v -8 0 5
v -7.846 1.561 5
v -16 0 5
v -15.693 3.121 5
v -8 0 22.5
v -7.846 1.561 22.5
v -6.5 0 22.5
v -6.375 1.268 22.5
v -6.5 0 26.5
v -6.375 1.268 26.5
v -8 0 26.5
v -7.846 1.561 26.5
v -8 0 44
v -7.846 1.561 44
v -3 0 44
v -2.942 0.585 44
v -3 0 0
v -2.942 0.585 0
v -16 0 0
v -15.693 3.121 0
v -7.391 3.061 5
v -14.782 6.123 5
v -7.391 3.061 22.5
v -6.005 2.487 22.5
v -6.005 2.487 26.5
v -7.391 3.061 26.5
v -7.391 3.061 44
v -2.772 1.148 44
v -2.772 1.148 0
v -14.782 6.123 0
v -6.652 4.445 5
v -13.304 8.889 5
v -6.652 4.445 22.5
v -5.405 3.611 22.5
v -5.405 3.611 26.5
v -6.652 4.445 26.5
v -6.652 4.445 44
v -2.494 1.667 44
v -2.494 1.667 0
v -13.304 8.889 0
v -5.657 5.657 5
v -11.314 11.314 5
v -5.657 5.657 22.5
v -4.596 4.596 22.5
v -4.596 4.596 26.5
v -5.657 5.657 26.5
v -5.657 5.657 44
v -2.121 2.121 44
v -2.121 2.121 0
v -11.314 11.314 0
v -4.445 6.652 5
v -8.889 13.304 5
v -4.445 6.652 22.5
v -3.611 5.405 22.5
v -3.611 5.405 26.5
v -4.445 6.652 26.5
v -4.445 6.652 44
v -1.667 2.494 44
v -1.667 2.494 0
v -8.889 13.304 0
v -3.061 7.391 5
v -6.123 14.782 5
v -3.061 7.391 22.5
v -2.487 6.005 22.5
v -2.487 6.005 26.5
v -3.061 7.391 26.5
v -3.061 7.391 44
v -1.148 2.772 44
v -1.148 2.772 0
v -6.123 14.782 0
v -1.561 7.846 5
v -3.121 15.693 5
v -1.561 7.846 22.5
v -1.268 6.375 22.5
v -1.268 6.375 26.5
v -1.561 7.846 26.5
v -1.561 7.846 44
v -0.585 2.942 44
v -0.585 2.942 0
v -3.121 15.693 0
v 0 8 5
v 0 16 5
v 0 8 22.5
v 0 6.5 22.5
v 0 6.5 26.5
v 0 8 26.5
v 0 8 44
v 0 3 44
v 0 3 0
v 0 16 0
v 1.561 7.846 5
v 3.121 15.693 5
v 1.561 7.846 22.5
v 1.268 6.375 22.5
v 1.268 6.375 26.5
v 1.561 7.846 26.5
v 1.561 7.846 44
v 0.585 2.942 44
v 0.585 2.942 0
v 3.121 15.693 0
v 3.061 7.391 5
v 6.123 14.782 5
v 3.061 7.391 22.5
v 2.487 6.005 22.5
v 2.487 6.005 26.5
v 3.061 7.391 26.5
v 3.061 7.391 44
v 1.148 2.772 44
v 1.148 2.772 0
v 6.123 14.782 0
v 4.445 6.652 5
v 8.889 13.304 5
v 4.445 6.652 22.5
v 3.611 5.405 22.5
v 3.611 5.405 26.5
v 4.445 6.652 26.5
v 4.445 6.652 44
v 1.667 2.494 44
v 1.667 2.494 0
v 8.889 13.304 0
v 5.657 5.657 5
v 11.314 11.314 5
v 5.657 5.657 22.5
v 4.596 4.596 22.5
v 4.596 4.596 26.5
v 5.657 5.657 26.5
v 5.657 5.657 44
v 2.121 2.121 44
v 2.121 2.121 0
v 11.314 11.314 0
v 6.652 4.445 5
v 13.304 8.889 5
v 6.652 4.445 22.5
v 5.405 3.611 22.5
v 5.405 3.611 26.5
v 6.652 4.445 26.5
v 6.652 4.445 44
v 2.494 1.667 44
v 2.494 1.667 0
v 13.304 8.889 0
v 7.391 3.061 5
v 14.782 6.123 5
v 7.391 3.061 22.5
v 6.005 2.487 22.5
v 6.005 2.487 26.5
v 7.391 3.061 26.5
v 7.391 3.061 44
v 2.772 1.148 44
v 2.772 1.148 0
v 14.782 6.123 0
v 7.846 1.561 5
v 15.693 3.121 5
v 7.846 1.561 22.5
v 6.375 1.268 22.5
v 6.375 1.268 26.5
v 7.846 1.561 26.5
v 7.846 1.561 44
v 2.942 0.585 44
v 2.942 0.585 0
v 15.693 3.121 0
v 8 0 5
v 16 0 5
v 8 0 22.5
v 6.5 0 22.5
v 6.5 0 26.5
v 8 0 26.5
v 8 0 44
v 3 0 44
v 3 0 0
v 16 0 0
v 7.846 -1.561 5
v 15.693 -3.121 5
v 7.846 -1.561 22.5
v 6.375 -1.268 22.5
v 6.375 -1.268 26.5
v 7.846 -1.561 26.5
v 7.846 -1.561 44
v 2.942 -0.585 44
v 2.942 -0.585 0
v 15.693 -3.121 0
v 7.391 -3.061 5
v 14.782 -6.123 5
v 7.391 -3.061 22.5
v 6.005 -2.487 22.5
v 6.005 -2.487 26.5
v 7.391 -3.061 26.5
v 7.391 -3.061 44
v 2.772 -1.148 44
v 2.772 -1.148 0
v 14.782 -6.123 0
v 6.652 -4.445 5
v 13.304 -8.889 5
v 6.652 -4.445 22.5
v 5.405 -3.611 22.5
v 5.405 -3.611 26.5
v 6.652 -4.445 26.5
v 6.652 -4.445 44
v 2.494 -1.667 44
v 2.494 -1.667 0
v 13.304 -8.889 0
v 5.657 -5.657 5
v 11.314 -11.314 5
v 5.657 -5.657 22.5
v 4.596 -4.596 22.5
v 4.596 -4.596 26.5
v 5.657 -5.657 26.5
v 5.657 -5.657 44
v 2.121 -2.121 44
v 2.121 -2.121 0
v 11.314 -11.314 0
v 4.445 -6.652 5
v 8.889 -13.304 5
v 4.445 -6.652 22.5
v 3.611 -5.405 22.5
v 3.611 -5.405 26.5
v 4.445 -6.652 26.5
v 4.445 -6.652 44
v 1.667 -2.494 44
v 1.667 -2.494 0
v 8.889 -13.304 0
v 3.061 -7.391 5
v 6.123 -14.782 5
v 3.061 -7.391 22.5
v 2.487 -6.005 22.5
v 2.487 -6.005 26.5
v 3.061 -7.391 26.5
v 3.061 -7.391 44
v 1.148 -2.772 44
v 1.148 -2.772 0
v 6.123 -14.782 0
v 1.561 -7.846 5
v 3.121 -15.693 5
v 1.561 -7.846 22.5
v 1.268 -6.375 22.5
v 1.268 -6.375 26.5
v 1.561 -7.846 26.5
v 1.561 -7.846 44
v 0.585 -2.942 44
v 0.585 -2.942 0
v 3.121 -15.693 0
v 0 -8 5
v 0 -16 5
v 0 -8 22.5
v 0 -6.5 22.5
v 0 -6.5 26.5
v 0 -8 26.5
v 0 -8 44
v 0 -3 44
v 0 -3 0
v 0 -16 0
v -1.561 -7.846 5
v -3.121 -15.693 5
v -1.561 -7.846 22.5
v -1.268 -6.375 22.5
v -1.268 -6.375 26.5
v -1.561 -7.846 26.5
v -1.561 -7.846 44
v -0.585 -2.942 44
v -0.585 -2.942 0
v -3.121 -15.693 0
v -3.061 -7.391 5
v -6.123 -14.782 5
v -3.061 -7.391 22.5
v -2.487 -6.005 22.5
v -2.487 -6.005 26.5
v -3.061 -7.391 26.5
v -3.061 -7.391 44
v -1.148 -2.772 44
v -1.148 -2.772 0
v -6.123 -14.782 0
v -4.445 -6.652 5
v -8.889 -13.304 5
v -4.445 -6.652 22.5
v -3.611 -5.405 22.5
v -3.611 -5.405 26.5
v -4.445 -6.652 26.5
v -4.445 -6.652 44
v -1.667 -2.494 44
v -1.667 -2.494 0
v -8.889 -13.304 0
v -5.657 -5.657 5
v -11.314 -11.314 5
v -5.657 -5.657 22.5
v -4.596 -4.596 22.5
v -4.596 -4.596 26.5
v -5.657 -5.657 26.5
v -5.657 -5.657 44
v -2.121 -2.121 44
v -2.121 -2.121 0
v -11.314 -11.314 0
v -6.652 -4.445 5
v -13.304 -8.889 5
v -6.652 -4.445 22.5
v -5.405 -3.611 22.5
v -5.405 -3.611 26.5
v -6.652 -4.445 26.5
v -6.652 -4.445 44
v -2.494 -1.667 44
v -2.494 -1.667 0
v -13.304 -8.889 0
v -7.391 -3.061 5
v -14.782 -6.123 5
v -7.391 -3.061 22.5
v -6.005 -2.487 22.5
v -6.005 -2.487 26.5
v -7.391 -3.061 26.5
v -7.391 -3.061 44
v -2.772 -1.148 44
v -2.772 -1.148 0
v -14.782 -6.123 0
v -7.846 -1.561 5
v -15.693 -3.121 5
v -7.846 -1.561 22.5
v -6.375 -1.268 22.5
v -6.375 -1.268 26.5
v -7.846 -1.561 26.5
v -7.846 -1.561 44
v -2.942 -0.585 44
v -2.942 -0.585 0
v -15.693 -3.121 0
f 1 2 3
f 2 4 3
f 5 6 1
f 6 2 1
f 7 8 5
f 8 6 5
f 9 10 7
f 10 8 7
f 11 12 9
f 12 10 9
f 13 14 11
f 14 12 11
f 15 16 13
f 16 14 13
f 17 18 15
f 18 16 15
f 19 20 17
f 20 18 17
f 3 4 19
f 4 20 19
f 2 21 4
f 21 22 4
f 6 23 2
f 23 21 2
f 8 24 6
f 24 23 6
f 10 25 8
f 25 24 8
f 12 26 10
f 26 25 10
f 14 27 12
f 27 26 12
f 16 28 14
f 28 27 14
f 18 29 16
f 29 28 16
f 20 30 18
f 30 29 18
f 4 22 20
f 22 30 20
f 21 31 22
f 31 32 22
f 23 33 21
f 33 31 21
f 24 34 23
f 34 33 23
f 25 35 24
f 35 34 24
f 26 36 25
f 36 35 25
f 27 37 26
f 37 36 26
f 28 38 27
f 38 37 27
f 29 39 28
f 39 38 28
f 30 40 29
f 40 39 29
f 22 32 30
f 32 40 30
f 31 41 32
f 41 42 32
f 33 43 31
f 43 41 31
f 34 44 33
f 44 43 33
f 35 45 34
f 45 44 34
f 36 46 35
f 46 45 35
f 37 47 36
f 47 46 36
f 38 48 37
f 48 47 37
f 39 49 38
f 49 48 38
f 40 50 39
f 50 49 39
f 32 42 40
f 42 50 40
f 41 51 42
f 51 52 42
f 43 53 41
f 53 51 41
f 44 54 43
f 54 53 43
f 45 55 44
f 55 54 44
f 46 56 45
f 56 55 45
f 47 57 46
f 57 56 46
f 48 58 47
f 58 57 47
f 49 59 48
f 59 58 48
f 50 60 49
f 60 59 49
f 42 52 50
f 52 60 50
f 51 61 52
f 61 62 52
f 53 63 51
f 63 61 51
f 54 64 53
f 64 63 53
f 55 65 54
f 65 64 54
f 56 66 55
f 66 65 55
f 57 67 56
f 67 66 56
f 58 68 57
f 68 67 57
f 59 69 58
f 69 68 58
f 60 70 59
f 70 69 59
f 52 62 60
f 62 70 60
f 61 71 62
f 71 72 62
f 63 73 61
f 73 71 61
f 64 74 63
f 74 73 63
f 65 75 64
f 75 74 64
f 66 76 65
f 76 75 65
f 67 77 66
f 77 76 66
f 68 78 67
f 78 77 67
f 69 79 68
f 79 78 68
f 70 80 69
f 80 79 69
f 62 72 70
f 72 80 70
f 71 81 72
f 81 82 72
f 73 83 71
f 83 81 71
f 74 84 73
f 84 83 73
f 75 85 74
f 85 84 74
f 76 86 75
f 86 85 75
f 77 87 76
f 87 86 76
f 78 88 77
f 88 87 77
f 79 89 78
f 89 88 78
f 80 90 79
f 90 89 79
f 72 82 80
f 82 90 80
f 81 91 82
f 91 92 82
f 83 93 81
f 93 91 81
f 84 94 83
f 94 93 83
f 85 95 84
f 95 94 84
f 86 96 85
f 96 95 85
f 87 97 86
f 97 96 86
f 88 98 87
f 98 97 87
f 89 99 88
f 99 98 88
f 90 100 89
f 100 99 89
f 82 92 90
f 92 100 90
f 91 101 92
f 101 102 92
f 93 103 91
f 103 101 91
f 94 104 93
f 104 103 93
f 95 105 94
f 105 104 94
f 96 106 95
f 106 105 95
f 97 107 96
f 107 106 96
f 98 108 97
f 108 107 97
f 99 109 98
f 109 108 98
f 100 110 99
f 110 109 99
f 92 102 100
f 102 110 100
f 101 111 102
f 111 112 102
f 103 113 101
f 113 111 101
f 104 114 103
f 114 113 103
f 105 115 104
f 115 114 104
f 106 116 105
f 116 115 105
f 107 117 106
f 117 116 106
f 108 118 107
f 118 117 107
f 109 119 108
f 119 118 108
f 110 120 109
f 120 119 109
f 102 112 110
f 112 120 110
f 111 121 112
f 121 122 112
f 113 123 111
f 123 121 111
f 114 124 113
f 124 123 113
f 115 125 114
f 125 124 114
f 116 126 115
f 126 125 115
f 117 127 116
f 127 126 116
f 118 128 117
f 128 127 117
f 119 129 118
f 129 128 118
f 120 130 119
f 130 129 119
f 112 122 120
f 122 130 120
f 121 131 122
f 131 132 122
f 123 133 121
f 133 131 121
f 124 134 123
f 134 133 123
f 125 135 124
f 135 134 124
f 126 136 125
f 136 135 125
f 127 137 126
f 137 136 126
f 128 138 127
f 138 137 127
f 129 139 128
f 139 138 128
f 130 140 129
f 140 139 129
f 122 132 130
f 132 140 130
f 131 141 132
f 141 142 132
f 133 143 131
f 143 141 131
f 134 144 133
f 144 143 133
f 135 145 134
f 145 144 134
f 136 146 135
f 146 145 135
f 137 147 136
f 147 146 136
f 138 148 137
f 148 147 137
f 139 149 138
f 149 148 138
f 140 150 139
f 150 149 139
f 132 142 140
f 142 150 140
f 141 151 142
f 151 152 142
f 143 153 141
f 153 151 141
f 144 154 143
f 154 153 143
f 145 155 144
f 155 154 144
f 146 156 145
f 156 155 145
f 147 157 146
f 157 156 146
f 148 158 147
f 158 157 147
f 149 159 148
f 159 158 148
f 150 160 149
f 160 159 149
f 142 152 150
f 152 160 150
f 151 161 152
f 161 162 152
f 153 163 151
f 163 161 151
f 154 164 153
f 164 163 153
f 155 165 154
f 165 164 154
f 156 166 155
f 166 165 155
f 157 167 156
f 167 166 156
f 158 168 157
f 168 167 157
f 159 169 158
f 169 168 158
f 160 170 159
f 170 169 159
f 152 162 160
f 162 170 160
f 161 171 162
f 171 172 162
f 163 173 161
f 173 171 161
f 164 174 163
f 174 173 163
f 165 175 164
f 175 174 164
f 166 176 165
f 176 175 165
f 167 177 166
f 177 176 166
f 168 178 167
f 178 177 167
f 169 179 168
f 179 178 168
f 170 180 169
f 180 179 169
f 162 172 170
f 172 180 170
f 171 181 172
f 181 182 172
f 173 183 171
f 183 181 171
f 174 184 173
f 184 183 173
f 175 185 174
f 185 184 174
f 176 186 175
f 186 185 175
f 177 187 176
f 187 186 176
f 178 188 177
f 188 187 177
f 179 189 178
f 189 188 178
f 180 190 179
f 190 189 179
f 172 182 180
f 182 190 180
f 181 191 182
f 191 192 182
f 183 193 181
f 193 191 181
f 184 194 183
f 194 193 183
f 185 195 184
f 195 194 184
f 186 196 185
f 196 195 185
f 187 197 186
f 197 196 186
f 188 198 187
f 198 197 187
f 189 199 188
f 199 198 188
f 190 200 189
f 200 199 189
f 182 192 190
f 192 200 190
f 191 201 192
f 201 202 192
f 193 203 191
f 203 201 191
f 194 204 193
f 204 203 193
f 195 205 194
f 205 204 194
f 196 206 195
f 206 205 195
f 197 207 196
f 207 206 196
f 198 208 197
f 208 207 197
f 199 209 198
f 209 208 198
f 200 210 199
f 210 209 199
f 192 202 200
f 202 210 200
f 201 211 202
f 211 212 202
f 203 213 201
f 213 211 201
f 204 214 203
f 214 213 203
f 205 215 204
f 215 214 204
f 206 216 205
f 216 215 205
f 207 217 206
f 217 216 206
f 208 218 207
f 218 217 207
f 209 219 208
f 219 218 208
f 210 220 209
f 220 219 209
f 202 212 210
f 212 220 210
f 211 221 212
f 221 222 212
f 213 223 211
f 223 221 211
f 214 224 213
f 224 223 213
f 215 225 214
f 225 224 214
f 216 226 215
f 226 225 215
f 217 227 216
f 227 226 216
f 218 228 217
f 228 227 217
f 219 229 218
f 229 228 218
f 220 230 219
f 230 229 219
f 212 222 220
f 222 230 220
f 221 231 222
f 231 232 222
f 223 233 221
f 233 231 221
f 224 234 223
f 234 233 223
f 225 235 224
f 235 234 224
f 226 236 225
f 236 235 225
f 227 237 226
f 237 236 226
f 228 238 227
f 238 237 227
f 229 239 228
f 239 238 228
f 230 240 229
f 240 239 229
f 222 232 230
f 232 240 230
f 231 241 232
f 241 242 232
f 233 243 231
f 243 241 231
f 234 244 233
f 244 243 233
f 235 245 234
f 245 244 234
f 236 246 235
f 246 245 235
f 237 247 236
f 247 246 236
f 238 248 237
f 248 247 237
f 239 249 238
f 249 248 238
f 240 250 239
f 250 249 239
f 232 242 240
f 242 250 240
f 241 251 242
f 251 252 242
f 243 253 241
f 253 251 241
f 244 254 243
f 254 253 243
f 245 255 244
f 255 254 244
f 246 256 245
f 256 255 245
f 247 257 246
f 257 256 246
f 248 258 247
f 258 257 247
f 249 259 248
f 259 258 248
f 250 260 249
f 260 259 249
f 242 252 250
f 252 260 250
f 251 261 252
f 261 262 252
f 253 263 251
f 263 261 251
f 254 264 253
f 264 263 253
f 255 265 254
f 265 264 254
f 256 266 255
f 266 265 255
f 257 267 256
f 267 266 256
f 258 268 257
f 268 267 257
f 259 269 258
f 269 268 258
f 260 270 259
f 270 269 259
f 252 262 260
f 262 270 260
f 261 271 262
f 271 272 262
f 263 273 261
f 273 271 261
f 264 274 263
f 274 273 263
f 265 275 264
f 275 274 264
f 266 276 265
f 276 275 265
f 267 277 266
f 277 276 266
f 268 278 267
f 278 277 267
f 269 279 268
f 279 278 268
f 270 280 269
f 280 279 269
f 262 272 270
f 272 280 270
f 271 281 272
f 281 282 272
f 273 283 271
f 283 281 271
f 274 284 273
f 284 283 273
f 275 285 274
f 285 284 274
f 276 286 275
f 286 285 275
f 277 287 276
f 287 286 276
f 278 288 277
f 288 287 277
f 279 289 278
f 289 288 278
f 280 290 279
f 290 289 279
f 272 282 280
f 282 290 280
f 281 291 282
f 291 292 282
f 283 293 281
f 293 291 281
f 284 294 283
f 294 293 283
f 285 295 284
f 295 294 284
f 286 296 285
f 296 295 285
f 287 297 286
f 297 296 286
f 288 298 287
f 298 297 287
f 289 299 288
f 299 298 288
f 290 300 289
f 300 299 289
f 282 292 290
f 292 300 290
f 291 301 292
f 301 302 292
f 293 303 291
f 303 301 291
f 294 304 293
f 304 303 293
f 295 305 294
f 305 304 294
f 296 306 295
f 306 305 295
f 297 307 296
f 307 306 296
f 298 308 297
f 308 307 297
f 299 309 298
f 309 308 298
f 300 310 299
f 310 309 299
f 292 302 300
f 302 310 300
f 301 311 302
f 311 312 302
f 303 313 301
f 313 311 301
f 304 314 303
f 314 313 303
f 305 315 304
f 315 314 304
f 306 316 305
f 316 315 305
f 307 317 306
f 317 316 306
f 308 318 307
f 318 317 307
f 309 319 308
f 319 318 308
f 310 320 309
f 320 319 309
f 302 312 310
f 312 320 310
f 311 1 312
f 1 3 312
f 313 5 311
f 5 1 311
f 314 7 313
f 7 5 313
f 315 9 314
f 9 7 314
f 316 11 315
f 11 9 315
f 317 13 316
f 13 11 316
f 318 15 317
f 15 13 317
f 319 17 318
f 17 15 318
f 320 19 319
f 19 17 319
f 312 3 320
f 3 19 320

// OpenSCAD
$fn = 32;

// ----------------------------------------------------------------------
// Grooved revolve: flanged, bore R3
// ----------------------------------------------------------------------

// --- parameters (mm) ---
bore_r = 3;               // bore radius
outer_r = 8;              // outer radius of the body
total_h = 44;             // overall height, Z
wall = 5;                 // radial wall thickness
groove_w = 4;             // groove width
groove_d = 1.5;           // groove depth
grooves = 1;              // number of outer grooves
flange_r = 16;            // flange radius
flange_h = 5;             // flange height

bbox_x = 2 * flange_r;  // full diameter
bore_d = 2 * bore_r;  // bore diameter
body_d = 2 * outer_r;  // body diameter
flange_d = 2 * flange_r;  // flange diameter
revolve_angle = 360;  // full turn around the Z axis

profile = [[3, 0], [8, 0], [16, 0], [16, 5], [8, 5], [8, 22.5], [6.5, 22.5], [6.5, 26.5], [8, 26.5], [8, 44], [3, 44]];  // primary outline, 11 points, counter clockwise

// --- the one profile operation ---
rotate_extrude(angle = revolve_angle) polygon(points = profile);
